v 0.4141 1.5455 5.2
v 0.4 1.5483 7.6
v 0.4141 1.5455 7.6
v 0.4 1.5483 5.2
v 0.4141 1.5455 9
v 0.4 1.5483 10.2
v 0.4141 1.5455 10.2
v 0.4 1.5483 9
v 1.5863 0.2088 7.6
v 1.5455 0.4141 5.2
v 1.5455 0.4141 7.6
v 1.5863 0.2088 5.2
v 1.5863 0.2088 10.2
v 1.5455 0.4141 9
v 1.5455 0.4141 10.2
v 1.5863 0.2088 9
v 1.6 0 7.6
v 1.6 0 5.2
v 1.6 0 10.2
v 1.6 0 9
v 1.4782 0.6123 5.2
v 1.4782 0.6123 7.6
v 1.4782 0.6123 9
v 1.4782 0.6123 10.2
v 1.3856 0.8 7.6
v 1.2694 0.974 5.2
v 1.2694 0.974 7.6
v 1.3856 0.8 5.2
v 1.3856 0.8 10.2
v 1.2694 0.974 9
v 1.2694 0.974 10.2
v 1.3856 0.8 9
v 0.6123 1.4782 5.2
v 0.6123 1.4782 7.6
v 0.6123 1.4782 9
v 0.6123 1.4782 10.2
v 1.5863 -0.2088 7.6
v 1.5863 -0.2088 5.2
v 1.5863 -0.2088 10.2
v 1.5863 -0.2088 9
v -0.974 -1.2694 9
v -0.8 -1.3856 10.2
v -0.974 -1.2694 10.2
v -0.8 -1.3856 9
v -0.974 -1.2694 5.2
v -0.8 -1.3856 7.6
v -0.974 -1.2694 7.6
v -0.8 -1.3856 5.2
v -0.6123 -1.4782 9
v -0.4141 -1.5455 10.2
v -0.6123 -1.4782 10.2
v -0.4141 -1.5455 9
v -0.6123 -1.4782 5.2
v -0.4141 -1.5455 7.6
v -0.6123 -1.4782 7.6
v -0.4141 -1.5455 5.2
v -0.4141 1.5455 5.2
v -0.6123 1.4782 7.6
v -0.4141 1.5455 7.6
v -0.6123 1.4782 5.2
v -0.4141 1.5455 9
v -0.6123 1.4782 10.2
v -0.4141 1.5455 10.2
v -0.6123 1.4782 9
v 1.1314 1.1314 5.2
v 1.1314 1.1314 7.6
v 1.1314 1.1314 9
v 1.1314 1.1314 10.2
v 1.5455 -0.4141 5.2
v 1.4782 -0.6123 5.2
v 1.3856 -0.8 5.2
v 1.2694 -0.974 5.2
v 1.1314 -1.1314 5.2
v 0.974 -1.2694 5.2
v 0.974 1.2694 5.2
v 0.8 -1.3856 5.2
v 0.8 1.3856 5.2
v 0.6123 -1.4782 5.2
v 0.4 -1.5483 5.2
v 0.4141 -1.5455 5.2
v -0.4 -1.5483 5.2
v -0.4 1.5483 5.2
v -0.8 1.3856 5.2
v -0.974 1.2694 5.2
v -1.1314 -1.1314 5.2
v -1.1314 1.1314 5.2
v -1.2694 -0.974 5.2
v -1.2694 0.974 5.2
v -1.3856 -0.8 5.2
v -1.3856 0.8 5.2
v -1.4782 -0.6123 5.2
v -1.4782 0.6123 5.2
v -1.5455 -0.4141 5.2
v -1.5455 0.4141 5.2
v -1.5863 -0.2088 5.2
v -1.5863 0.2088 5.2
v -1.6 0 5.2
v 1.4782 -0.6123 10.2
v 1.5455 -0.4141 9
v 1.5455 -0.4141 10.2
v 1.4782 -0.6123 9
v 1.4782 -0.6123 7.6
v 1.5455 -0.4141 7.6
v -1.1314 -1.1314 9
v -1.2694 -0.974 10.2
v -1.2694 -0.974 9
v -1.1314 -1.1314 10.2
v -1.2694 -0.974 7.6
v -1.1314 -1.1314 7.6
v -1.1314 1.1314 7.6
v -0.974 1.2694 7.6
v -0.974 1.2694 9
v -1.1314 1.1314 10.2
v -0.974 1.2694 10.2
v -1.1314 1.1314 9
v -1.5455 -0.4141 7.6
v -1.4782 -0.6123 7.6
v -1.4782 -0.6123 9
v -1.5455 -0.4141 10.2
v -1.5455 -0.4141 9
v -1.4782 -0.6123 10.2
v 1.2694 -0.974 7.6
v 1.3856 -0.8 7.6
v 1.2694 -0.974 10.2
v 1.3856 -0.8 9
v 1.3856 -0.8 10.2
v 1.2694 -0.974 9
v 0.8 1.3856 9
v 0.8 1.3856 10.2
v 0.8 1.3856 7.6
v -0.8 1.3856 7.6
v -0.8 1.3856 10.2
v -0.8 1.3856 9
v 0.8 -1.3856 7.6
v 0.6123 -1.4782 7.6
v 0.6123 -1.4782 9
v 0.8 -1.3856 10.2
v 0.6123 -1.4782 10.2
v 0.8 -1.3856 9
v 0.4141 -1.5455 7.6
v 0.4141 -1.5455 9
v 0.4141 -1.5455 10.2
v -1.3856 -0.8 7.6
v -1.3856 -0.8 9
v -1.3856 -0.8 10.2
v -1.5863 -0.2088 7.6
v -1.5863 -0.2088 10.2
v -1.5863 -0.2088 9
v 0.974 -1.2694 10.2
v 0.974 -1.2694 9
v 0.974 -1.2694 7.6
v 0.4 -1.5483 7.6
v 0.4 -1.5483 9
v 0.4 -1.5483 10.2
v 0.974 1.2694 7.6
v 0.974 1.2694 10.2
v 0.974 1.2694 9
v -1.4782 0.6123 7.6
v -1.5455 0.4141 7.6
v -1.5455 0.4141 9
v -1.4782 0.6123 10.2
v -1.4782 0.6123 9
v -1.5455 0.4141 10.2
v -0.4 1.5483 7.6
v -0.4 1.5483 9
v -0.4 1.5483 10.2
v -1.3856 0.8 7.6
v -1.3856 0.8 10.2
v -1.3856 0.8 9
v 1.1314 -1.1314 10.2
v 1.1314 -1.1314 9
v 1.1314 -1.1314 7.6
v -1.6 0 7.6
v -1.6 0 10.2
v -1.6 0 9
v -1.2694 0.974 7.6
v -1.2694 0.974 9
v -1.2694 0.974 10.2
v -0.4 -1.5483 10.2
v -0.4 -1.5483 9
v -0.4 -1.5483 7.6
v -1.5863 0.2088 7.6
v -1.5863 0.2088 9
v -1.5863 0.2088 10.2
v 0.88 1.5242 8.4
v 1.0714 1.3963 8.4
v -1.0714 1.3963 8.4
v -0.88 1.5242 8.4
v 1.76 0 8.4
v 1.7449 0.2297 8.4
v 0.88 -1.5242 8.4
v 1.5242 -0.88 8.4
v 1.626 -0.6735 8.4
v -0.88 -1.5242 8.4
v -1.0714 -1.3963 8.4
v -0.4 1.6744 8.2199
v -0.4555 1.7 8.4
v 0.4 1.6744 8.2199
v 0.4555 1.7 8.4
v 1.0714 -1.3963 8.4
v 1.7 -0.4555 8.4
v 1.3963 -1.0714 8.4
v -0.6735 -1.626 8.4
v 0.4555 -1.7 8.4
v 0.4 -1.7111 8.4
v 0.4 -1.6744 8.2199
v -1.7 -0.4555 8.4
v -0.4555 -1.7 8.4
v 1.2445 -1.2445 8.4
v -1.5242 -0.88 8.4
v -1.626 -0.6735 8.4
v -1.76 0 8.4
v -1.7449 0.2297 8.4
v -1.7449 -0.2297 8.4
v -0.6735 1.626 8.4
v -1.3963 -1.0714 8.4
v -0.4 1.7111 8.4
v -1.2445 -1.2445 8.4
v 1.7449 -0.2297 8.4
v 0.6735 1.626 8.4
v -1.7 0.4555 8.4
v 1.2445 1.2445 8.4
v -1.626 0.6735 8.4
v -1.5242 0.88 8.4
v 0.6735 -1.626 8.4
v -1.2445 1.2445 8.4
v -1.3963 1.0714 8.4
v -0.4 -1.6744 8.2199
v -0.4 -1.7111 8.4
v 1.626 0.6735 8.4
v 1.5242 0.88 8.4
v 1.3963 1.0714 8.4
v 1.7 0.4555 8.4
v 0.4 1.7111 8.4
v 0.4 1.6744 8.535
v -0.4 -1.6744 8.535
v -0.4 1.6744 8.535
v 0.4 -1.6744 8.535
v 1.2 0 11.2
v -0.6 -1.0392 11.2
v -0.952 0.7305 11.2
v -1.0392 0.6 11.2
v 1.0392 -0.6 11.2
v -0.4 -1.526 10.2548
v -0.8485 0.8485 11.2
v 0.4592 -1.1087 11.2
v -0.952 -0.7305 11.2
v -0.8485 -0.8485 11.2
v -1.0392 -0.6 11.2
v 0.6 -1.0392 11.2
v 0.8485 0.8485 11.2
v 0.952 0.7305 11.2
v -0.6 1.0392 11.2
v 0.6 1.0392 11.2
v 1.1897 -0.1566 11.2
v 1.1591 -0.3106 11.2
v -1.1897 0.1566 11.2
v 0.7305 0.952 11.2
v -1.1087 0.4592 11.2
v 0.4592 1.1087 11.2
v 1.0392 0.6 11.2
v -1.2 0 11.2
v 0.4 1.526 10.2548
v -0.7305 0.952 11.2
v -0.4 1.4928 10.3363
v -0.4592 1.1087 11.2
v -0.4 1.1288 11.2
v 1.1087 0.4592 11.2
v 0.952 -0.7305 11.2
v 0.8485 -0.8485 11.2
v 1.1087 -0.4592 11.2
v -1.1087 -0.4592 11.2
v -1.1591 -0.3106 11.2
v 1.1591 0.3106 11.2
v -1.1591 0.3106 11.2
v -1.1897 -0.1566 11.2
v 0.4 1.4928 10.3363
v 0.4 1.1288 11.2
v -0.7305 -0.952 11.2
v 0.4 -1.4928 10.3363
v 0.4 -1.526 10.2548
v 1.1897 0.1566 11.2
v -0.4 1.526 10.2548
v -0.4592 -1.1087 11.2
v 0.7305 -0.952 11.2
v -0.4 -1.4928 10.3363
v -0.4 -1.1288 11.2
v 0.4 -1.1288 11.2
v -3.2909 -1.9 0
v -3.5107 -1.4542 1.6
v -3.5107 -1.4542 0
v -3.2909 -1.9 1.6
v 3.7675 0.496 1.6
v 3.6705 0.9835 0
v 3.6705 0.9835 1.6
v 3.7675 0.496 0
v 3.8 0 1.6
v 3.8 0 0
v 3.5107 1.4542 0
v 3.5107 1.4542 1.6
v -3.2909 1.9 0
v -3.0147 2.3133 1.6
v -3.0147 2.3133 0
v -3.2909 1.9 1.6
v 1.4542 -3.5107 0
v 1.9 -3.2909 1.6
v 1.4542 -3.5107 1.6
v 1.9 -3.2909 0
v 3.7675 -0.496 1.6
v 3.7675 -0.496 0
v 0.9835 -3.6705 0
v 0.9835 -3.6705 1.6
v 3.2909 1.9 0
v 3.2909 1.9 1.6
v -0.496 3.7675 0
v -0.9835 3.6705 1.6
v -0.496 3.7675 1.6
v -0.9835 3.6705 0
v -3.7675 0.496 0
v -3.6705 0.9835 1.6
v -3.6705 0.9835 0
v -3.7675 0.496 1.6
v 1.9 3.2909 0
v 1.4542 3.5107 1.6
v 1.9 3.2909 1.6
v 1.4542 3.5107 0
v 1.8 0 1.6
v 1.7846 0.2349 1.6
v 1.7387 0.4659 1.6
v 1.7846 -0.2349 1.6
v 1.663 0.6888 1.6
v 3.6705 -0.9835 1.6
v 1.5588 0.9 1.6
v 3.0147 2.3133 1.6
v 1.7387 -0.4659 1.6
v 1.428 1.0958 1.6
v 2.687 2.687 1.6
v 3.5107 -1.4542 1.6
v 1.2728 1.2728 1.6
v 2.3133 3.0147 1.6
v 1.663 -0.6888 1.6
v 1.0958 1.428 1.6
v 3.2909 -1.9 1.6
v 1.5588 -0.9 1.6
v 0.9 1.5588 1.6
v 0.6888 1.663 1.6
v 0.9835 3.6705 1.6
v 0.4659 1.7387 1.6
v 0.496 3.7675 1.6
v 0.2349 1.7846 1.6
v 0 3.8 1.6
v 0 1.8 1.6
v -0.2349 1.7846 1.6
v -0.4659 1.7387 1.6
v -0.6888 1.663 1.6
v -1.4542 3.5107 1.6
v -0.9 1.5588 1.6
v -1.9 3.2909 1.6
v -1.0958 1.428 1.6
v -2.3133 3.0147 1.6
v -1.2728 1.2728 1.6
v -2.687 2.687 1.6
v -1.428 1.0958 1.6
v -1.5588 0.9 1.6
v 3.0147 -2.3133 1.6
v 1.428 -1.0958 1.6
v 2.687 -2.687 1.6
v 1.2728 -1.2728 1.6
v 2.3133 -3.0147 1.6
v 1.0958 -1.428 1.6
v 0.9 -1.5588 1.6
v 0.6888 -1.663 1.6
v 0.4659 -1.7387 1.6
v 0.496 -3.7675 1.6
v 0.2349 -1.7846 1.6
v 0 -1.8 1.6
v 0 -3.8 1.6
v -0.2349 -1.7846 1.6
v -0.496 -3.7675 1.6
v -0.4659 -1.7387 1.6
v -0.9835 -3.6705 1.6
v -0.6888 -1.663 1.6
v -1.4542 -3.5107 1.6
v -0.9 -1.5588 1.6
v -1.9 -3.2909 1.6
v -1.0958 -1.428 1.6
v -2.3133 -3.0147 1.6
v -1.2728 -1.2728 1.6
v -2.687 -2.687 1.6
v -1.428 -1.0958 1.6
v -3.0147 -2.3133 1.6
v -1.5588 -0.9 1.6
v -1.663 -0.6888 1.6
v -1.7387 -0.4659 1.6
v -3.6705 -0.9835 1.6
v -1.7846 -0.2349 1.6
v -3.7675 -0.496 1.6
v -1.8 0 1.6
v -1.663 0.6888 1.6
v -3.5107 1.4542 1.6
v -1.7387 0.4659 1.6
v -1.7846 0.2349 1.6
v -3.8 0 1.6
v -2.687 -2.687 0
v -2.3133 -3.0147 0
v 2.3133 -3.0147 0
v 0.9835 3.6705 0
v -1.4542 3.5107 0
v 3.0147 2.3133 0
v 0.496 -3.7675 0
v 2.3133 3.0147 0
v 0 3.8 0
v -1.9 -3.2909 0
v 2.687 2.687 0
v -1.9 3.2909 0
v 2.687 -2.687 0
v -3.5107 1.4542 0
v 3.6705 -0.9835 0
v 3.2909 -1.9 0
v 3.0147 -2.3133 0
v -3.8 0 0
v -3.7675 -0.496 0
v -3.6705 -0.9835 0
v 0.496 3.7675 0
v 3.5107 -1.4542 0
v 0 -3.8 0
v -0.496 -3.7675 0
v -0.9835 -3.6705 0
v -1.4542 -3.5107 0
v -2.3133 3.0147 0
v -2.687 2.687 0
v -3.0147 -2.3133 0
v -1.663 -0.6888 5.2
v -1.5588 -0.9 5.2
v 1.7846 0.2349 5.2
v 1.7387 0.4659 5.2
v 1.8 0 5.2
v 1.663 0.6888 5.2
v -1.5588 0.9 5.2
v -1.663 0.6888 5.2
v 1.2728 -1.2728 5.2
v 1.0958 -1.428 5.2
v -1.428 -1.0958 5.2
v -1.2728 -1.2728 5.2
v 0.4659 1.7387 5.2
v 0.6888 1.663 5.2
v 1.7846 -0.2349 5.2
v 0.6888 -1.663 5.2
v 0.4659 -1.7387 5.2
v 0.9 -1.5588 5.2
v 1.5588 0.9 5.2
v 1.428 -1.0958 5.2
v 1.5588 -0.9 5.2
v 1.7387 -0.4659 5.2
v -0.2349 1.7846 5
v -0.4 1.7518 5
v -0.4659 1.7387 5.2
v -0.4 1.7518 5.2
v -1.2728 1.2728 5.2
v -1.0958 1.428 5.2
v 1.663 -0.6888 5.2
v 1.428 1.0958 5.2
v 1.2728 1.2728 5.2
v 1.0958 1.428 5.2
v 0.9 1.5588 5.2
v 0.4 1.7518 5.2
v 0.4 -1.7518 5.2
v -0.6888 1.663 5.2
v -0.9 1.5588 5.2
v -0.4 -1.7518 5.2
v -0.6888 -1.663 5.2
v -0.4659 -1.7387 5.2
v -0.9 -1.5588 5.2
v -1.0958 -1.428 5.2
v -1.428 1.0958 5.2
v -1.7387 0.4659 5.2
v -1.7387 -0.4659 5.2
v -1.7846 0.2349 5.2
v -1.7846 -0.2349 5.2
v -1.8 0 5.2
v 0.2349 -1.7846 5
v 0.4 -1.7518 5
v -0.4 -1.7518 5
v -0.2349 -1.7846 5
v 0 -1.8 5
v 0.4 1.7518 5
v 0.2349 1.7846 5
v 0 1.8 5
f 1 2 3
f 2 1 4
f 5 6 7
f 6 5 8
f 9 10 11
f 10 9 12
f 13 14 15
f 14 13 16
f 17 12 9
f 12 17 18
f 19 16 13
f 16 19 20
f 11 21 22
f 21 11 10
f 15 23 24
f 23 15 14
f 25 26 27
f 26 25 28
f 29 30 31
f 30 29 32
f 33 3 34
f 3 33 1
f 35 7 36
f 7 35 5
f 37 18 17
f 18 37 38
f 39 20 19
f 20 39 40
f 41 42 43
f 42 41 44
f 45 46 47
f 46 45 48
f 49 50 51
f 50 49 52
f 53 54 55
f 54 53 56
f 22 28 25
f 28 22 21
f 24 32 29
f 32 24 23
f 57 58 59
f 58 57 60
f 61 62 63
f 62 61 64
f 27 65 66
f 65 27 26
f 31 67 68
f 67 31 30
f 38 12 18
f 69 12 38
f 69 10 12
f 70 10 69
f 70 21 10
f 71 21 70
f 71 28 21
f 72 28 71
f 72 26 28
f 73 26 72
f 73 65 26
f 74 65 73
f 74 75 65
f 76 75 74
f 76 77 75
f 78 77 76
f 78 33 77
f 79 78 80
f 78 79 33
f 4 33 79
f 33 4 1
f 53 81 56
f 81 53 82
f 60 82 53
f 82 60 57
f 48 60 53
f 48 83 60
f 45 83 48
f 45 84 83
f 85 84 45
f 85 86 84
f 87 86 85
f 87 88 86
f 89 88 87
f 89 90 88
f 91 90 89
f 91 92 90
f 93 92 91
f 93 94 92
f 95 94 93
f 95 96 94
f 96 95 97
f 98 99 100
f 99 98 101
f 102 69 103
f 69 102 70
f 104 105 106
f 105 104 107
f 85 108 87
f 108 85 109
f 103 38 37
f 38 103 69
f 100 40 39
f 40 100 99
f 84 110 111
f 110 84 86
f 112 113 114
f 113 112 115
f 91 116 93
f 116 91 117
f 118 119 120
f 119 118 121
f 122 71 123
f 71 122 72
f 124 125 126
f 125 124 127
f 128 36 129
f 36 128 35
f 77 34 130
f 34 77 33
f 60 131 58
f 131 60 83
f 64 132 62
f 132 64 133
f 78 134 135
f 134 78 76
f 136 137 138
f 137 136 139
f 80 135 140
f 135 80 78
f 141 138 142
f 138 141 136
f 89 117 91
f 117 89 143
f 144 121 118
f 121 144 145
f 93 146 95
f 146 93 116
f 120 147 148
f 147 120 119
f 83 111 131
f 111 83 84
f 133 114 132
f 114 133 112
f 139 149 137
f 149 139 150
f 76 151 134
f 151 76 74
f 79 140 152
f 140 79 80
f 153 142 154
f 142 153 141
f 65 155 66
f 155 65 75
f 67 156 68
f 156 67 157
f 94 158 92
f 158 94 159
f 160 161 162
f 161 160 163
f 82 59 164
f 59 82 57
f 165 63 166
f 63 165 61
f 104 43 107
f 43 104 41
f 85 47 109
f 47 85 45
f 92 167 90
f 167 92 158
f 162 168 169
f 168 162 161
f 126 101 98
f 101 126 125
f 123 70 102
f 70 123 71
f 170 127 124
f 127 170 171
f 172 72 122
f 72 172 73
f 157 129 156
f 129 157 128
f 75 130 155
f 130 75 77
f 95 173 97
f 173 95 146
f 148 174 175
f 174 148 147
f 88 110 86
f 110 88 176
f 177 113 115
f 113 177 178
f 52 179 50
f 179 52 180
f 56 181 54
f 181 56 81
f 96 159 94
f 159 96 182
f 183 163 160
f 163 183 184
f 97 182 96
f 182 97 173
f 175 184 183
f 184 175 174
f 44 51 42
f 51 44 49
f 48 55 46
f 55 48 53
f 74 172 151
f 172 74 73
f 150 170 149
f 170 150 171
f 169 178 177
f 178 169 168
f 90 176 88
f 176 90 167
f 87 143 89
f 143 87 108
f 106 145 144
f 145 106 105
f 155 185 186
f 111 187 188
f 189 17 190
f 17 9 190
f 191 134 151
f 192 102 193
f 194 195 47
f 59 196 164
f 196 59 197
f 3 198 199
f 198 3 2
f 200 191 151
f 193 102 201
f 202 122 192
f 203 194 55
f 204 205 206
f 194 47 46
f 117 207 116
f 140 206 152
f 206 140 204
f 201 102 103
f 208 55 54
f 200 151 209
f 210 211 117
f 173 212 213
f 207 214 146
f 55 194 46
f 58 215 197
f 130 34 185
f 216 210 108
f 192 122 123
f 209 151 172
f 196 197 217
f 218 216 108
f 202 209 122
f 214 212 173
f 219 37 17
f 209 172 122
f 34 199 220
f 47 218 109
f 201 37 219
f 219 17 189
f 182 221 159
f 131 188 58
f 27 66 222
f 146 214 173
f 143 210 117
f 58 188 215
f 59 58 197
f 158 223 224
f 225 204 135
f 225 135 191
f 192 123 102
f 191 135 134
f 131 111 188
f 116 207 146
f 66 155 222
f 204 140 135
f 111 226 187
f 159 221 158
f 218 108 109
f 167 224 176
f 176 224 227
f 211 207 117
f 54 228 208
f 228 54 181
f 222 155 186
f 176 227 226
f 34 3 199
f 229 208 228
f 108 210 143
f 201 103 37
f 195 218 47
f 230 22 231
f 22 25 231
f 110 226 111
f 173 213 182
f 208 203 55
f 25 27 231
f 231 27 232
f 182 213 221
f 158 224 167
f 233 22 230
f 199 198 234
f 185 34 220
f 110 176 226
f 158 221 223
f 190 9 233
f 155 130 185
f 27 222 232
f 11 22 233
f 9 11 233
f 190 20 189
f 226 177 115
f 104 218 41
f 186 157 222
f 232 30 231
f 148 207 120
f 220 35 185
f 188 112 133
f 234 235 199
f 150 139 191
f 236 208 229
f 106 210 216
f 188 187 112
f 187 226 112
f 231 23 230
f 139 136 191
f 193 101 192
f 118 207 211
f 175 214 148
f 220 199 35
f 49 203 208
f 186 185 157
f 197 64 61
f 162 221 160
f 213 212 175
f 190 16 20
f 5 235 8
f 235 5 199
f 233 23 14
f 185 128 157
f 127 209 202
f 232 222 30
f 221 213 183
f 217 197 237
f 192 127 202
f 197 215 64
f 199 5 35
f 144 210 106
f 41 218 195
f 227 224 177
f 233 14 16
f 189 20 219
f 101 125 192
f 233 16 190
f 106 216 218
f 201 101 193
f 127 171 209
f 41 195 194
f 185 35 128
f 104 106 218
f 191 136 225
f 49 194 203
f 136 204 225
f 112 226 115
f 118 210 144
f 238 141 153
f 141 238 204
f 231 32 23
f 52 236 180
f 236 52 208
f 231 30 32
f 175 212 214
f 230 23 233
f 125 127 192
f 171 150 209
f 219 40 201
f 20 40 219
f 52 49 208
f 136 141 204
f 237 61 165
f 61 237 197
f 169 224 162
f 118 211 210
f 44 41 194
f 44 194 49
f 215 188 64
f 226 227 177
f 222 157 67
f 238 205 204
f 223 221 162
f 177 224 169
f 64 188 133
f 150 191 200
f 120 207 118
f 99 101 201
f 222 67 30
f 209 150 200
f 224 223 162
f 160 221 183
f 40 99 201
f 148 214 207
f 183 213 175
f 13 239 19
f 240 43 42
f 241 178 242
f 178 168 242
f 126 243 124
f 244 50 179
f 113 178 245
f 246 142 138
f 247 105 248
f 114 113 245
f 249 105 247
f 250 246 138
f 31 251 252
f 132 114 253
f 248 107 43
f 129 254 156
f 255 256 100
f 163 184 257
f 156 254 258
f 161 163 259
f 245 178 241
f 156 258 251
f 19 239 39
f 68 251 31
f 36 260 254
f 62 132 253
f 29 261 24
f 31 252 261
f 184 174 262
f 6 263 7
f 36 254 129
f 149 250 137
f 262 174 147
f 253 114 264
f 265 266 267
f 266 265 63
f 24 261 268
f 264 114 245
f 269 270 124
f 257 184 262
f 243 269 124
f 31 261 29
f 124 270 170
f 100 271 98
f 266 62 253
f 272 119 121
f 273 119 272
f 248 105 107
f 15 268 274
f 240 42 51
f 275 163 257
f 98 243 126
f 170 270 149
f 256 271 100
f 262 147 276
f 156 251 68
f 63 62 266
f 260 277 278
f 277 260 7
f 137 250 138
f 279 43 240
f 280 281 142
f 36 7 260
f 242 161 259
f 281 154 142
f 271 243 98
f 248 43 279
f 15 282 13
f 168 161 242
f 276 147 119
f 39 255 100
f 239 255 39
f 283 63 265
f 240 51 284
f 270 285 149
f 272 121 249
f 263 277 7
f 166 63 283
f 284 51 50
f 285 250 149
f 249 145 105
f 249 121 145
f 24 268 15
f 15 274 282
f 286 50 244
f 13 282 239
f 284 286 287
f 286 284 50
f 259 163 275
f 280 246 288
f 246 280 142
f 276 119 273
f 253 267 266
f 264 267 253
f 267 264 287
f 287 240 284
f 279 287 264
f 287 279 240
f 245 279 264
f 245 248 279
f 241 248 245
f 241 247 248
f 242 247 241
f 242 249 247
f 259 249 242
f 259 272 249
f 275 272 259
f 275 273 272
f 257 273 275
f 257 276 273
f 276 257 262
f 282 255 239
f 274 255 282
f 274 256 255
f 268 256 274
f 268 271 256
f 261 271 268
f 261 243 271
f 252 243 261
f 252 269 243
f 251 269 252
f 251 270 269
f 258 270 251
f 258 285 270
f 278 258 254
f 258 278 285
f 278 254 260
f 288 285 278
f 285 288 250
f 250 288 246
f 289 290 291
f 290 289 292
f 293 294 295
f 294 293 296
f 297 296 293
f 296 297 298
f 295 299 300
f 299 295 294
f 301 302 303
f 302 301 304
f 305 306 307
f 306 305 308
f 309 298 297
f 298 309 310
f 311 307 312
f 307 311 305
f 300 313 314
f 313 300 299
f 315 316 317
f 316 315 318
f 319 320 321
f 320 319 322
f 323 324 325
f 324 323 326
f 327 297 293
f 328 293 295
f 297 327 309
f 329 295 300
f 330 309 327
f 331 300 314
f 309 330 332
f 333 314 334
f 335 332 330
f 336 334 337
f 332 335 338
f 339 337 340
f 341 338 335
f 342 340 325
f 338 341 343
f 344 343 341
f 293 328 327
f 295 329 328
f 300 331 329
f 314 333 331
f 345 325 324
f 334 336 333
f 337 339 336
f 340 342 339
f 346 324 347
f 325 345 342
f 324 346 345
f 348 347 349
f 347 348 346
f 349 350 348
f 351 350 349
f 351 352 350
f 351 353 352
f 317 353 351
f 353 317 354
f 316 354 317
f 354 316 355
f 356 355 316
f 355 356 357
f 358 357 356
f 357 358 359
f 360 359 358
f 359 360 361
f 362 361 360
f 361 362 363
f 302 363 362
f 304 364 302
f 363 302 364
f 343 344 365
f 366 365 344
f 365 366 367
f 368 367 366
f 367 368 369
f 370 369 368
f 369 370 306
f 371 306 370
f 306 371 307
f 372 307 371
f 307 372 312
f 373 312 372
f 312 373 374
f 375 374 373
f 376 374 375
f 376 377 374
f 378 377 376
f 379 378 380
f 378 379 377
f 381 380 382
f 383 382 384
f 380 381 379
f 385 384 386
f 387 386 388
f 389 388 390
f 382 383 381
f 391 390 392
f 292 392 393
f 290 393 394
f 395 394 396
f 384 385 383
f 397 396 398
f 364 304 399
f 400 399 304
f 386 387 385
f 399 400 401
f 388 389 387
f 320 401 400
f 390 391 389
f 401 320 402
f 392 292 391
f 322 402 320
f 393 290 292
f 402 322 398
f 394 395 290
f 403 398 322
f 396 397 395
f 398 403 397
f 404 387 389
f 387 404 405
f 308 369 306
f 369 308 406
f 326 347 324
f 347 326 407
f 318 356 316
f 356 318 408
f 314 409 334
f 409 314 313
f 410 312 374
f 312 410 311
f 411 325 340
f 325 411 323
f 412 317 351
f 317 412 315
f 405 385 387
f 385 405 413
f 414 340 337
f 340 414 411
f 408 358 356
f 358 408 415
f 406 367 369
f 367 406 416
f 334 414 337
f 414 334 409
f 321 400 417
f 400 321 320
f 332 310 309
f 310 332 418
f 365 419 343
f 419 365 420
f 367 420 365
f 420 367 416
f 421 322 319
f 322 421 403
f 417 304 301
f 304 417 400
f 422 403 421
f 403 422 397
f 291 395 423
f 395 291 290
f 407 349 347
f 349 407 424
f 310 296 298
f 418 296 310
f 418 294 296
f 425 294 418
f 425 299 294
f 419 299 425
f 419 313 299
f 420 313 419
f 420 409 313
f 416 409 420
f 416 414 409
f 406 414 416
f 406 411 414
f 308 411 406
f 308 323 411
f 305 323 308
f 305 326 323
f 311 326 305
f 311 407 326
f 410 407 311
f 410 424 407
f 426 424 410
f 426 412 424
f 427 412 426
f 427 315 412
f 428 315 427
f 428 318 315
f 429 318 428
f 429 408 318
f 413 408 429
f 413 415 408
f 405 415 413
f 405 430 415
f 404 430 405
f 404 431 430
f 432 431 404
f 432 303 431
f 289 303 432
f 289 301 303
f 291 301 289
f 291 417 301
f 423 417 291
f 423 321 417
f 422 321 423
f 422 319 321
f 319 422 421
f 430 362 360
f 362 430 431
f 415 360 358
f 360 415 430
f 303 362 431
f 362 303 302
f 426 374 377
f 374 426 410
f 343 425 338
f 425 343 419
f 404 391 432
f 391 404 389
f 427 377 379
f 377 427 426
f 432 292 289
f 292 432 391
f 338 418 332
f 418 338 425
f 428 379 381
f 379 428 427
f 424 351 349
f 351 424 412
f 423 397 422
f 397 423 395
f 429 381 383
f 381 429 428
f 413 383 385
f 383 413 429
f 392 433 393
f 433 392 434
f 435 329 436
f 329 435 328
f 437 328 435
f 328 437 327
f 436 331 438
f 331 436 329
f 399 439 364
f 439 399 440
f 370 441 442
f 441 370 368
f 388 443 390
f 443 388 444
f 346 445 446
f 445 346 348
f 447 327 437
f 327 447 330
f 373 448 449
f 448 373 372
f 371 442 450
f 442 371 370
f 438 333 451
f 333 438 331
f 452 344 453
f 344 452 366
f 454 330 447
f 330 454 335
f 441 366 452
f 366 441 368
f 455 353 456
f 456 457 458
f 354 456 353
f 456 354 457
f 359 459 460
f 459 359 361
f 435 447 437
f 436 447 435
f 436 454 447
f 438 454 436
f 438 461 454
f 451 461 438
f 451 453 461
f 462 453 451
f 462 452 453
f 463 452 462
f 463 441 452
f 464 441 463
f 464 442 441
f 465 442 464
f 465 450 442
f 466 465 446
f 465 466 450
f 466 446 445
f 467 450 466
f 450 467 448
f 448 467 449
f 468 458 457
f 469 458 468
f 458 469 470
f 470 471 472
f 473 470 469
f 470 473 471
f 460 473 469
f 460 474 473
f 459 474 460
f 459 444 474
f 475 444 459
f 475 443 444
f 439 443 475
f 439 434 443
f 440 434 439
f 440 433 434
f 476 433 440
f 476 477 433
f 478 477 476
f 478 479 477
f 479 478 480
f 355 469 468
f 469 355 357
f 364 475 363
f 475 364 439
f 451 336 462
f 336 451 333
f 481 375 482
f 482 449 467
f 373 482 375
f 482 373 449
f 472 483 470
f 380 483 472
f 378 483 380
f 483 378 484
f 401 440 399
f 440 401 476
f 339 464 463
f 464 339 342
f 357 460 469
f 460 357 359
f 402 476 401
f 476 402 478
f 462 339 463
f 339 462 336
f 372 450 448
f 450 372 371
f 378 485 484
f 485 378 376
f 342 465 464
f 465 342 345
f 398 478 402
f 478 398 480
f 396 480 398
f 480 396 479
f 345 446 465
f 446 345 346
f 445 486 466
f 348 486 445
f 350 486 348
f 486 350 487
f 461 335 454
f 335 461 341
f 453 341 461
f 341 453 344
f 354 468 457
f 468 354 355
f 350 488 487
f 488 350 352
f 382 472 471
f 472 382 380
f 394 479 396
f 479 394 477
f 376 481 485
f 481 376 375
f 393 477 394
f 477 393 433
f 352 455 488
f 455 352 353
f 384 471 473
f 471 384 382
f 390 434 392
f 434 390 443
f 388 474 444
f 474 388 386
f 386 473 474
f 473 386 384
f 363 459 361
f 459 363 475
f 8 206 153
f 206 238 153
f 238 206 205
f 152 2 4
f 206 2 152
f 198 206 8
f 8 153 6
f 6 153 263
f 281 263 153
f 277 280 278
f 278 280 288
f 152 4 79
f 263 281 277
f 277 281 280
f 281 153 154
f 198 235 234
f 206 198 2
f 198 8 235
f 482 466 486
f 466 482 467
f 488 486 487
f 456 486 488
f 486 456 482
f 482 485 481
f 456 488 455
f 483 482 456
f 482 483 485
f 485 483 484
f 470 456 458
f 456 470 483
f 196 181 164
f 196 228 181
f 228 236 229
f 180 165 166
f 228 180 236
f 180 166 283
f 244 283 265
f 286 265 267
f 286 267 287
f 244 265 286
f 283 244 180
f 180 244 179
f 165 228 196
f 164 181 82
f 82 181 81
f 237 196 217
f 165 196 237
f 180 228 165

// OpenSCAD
// ====================================================================
// Modular Rotor Axle Pin & Retaining Cap (5.0 cm Standard)
// Precision bearing pin for low-friction rotation of the main rotor.
//
// Engineering Specifications:
// - Cap Head: 7.6mm diameter x 1.6mm height with chamfered top
// - Bearing Spindle: 3.6mm diameter x 3.6mm length (matches 4.2mm rotor bore)
//   -> 0.6mm diametral clearance ensures free, low-friction spin
//   -> 0.4mm axial play prevents vertical pinching
// - Anchor Stem: 3.2mm diameter x 6.0mm length with retention barb (matches 3.5mm bore)
// - Central compliance slit (0.8mm) enables spring-loaded snap retention
// - 100% supportless vertical print grounded on flat cap head (Z = 0)
// ====================================================================

$fn = 48;

cap_d     = 7.6;
cap_h     = 1.6;
journal_d = 3.6;
journal_h = 3.6;
stem_d    = 3.2;
stem_h    = 6.0;
barb_d    = 3.52; // Slight snap-retaining barb

module rotor_axle_pin() {
    difference() {
        union() {
            // 1. Cap Head (grounded at Z = 0)
            cylinder(d = cap_d, h = cap_h, center = false);
            // Cap chamfer
            translate([0, 0, cap_h - 0.4])
                cylinder(d1 = cap_d, d2 = cap_d - 0.8, h = 0.4, center = false);

            // 2. Bearing Spindle Journal (smooth rotation surface)
            translate([0, 0, cap_h])
                cylinder(d = journal_d, h = journal_h, center = false);

            // 3. Anchor Stem
            translate([0, 0, cap_h + journal_h]) {
                // Shaft
                cylinder(d = stem_d, h = stem_h - 1.0, center = false);

                // Retention barb ring
                translate([0, 0, 2.4])
                    cylinder(d1 = stem_d, d2 = barb_d, h = 0.8, center = false);
                translate([0, 0, 3.2])
                    cylinder(d1 = barb_d, d2 = stem_d, h = 0.6, center = false);

                // Lead-in chamfer at tip for easy insertion
                translate([0, 0, stem_h - 1.0])
                    cylinder(d1 = stem_d, d2 = stem_d - 0.8, h = 1.0, center = false);
            }
        }

        // Longitudinal compliance slot in stem (spring-loaded snap action)
        translate([0, 0, cap_h + journal_h + stem_h/2])
            cube([0.8, stem_d + 1.2, stem_h + 0.4], center = true);
    }
}

// Standalone print orientation: Head flat on bed at Z = 0
rotor_axle_pin();
